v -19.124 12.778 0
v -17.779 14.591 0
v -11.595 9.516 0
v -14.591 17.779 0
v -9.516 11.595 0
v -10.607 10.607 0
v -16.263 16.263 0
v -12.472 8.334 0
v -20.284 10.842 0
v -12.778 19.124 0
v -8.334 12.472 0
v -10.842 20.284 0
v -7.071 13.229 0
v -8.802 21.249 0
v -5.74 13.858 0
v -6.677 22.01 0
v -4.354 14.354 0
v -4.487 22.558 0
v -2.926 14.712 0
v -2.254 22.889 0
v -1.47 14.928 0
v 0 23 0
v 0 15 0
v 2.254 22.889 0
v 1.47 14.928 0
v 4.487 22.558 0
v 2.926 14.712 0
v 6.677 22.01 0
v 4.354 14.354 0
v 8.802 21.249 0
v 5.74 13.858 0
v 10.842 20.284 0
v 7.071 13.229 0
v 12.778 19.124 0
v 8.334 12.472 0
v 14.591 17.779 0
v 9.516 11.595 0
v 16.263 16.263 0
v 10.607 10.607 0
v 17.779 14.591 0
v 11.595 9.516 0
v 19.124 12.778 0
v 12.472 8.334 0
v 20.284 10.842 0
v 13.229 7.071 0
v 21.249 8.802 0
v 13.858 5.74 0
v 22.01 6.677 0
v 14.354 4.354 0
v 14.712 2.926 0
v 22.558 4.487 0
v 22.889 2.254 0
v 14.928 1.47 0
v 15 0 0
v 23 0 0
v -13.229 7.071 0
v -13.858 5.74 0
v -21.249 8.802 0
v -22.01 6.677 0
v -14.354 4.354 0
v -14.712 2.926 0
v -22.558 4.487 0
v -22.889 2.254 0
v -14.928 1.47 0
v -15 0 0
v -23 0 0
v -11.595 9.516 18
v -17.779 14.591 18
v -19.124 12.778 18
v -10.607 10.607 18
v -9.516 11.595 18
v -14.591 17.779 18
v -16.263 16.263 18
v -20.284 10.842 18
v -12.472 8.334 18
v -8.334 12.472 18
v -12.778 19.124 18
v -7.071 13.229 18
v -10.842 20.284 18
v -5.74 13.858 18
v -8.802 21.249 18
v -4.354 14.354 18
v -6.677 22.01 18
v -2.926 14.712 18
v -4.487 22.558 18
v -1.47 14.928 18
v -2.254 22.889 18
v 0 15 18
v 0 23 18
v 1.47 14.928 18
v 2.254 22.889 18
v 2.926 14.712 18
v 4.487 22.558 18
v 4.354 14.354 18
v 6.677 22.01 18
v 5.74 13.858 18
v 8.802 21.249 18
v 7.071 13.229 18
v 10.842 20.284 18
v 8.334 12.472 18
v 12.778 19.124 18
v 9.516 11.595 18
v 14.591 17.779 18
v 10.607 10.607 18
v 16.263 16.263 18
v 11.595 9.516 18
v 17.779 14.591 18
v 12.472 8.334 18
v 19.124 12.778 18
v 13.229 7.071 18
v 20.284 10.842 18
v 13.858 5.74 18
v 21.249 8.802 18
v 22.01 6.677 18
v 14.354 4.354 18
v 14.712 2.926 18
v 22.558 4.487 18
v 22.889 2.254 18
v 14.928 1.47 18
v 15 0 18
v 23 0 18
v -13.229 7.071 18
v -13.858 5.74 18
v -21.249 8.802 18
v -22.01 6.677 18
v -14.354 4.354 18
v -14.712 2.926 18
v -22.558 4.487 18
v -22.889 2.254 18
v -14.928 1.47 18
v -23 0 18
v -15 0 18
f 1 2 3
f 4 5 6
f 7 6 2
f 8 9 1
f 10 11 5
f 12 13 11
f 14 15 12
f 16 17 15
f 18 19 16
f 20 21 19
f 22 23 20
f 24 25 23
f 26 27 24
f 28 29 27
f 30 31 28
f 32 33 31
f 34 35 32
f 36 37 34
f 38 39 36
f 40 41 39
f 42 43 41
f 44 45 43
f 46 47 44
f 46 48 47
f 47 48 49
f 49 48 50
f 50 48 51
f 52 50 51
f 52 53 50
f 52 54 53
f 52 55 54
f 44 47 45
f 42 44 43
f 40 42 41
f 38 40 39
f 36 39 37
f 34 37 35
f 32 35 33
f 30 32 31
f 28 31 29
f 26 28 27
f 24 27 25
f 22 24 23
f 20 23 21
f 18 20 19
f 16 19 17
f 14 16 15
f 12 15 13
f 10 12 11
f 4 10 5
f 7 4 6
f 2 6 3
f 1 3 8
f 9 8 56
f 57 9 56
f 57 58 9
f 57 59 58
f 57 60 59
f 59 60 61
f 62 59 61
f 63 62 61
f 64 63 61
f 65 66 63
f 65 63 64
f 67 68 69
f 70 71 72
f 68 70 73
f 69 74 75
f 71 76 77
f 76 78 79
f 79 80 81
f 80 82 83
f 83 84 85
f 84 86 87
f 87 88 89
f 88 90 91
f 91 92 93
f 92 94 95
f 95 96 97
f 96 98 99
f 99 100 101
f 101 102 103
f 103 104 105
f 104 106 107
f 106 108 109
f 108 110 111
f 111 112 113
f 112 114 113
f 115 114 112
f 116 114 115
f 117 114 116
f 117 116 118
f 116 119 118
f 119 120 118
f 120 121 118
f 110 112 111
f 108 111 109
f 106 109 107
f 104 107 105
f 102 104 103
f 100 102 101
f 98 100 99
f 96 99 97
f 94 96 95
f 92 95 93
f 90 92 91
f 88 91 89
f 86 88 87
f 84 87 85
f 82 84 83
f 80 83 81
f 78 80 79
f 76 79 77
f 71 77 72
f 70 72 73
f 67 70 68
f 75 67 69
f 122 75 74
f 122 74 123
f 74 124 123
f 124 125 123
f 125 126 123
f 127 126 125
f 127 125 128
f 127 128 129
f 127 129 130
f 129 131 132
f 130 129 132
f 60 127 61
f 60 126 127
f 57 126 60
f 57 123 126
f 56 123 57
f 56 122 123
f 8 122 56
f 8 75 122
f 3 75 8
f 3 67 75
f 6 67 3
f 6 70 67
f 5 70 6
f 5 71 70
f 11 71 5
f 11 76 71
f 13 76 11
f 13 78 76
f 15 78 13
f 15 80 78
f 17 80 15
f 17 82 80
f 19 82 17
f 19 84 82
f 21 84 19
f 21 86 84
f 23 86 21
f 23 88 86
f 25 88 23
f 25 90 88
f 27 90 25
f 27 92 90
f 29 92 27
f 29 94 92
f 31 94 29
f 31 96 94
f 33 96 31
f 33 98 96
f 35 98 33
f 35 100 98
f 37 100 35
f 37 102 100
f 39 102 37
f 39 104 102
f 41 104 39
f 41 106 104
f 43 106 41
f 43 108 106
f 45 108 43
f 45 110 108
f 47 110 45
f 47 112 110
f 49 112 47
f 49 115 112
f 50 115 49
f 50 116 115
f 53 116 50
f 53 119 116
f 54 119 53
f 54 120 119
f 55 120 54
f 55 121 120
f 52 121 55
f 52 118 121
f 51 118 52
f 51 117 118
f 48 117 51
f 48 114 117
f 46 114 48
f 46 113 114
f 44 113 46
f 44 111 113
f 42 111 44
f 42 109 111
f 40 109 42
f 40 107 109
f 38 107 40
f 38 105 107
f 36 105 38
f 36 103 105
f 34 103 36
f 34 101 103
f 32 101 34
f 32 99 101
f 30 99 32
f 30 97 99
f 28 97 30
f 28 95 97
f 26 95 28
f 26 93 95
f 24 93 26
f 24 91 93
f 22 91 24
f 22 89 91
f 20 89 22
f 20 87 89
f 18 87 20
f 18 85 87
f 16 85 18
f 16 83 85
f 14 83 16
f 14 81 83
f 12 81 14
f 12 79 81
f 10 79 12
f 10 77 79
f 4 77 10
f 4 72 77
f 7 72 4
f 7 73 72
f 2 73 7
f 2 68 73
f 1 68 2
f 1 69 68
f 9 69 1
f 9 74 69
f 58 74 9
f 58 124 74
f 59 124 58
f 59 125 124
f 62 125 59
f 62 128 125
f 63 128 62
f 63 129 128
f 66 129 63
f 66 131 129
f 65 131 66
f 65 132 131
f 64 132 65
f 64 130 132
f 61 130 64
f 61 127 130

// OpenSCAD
$fn = 64;
linear_extrude(height = 18)
  difference() {
    circle(r = 23);
    circle(r = 15);
    translate([-30, -30]) square([60, 30]);
  }
